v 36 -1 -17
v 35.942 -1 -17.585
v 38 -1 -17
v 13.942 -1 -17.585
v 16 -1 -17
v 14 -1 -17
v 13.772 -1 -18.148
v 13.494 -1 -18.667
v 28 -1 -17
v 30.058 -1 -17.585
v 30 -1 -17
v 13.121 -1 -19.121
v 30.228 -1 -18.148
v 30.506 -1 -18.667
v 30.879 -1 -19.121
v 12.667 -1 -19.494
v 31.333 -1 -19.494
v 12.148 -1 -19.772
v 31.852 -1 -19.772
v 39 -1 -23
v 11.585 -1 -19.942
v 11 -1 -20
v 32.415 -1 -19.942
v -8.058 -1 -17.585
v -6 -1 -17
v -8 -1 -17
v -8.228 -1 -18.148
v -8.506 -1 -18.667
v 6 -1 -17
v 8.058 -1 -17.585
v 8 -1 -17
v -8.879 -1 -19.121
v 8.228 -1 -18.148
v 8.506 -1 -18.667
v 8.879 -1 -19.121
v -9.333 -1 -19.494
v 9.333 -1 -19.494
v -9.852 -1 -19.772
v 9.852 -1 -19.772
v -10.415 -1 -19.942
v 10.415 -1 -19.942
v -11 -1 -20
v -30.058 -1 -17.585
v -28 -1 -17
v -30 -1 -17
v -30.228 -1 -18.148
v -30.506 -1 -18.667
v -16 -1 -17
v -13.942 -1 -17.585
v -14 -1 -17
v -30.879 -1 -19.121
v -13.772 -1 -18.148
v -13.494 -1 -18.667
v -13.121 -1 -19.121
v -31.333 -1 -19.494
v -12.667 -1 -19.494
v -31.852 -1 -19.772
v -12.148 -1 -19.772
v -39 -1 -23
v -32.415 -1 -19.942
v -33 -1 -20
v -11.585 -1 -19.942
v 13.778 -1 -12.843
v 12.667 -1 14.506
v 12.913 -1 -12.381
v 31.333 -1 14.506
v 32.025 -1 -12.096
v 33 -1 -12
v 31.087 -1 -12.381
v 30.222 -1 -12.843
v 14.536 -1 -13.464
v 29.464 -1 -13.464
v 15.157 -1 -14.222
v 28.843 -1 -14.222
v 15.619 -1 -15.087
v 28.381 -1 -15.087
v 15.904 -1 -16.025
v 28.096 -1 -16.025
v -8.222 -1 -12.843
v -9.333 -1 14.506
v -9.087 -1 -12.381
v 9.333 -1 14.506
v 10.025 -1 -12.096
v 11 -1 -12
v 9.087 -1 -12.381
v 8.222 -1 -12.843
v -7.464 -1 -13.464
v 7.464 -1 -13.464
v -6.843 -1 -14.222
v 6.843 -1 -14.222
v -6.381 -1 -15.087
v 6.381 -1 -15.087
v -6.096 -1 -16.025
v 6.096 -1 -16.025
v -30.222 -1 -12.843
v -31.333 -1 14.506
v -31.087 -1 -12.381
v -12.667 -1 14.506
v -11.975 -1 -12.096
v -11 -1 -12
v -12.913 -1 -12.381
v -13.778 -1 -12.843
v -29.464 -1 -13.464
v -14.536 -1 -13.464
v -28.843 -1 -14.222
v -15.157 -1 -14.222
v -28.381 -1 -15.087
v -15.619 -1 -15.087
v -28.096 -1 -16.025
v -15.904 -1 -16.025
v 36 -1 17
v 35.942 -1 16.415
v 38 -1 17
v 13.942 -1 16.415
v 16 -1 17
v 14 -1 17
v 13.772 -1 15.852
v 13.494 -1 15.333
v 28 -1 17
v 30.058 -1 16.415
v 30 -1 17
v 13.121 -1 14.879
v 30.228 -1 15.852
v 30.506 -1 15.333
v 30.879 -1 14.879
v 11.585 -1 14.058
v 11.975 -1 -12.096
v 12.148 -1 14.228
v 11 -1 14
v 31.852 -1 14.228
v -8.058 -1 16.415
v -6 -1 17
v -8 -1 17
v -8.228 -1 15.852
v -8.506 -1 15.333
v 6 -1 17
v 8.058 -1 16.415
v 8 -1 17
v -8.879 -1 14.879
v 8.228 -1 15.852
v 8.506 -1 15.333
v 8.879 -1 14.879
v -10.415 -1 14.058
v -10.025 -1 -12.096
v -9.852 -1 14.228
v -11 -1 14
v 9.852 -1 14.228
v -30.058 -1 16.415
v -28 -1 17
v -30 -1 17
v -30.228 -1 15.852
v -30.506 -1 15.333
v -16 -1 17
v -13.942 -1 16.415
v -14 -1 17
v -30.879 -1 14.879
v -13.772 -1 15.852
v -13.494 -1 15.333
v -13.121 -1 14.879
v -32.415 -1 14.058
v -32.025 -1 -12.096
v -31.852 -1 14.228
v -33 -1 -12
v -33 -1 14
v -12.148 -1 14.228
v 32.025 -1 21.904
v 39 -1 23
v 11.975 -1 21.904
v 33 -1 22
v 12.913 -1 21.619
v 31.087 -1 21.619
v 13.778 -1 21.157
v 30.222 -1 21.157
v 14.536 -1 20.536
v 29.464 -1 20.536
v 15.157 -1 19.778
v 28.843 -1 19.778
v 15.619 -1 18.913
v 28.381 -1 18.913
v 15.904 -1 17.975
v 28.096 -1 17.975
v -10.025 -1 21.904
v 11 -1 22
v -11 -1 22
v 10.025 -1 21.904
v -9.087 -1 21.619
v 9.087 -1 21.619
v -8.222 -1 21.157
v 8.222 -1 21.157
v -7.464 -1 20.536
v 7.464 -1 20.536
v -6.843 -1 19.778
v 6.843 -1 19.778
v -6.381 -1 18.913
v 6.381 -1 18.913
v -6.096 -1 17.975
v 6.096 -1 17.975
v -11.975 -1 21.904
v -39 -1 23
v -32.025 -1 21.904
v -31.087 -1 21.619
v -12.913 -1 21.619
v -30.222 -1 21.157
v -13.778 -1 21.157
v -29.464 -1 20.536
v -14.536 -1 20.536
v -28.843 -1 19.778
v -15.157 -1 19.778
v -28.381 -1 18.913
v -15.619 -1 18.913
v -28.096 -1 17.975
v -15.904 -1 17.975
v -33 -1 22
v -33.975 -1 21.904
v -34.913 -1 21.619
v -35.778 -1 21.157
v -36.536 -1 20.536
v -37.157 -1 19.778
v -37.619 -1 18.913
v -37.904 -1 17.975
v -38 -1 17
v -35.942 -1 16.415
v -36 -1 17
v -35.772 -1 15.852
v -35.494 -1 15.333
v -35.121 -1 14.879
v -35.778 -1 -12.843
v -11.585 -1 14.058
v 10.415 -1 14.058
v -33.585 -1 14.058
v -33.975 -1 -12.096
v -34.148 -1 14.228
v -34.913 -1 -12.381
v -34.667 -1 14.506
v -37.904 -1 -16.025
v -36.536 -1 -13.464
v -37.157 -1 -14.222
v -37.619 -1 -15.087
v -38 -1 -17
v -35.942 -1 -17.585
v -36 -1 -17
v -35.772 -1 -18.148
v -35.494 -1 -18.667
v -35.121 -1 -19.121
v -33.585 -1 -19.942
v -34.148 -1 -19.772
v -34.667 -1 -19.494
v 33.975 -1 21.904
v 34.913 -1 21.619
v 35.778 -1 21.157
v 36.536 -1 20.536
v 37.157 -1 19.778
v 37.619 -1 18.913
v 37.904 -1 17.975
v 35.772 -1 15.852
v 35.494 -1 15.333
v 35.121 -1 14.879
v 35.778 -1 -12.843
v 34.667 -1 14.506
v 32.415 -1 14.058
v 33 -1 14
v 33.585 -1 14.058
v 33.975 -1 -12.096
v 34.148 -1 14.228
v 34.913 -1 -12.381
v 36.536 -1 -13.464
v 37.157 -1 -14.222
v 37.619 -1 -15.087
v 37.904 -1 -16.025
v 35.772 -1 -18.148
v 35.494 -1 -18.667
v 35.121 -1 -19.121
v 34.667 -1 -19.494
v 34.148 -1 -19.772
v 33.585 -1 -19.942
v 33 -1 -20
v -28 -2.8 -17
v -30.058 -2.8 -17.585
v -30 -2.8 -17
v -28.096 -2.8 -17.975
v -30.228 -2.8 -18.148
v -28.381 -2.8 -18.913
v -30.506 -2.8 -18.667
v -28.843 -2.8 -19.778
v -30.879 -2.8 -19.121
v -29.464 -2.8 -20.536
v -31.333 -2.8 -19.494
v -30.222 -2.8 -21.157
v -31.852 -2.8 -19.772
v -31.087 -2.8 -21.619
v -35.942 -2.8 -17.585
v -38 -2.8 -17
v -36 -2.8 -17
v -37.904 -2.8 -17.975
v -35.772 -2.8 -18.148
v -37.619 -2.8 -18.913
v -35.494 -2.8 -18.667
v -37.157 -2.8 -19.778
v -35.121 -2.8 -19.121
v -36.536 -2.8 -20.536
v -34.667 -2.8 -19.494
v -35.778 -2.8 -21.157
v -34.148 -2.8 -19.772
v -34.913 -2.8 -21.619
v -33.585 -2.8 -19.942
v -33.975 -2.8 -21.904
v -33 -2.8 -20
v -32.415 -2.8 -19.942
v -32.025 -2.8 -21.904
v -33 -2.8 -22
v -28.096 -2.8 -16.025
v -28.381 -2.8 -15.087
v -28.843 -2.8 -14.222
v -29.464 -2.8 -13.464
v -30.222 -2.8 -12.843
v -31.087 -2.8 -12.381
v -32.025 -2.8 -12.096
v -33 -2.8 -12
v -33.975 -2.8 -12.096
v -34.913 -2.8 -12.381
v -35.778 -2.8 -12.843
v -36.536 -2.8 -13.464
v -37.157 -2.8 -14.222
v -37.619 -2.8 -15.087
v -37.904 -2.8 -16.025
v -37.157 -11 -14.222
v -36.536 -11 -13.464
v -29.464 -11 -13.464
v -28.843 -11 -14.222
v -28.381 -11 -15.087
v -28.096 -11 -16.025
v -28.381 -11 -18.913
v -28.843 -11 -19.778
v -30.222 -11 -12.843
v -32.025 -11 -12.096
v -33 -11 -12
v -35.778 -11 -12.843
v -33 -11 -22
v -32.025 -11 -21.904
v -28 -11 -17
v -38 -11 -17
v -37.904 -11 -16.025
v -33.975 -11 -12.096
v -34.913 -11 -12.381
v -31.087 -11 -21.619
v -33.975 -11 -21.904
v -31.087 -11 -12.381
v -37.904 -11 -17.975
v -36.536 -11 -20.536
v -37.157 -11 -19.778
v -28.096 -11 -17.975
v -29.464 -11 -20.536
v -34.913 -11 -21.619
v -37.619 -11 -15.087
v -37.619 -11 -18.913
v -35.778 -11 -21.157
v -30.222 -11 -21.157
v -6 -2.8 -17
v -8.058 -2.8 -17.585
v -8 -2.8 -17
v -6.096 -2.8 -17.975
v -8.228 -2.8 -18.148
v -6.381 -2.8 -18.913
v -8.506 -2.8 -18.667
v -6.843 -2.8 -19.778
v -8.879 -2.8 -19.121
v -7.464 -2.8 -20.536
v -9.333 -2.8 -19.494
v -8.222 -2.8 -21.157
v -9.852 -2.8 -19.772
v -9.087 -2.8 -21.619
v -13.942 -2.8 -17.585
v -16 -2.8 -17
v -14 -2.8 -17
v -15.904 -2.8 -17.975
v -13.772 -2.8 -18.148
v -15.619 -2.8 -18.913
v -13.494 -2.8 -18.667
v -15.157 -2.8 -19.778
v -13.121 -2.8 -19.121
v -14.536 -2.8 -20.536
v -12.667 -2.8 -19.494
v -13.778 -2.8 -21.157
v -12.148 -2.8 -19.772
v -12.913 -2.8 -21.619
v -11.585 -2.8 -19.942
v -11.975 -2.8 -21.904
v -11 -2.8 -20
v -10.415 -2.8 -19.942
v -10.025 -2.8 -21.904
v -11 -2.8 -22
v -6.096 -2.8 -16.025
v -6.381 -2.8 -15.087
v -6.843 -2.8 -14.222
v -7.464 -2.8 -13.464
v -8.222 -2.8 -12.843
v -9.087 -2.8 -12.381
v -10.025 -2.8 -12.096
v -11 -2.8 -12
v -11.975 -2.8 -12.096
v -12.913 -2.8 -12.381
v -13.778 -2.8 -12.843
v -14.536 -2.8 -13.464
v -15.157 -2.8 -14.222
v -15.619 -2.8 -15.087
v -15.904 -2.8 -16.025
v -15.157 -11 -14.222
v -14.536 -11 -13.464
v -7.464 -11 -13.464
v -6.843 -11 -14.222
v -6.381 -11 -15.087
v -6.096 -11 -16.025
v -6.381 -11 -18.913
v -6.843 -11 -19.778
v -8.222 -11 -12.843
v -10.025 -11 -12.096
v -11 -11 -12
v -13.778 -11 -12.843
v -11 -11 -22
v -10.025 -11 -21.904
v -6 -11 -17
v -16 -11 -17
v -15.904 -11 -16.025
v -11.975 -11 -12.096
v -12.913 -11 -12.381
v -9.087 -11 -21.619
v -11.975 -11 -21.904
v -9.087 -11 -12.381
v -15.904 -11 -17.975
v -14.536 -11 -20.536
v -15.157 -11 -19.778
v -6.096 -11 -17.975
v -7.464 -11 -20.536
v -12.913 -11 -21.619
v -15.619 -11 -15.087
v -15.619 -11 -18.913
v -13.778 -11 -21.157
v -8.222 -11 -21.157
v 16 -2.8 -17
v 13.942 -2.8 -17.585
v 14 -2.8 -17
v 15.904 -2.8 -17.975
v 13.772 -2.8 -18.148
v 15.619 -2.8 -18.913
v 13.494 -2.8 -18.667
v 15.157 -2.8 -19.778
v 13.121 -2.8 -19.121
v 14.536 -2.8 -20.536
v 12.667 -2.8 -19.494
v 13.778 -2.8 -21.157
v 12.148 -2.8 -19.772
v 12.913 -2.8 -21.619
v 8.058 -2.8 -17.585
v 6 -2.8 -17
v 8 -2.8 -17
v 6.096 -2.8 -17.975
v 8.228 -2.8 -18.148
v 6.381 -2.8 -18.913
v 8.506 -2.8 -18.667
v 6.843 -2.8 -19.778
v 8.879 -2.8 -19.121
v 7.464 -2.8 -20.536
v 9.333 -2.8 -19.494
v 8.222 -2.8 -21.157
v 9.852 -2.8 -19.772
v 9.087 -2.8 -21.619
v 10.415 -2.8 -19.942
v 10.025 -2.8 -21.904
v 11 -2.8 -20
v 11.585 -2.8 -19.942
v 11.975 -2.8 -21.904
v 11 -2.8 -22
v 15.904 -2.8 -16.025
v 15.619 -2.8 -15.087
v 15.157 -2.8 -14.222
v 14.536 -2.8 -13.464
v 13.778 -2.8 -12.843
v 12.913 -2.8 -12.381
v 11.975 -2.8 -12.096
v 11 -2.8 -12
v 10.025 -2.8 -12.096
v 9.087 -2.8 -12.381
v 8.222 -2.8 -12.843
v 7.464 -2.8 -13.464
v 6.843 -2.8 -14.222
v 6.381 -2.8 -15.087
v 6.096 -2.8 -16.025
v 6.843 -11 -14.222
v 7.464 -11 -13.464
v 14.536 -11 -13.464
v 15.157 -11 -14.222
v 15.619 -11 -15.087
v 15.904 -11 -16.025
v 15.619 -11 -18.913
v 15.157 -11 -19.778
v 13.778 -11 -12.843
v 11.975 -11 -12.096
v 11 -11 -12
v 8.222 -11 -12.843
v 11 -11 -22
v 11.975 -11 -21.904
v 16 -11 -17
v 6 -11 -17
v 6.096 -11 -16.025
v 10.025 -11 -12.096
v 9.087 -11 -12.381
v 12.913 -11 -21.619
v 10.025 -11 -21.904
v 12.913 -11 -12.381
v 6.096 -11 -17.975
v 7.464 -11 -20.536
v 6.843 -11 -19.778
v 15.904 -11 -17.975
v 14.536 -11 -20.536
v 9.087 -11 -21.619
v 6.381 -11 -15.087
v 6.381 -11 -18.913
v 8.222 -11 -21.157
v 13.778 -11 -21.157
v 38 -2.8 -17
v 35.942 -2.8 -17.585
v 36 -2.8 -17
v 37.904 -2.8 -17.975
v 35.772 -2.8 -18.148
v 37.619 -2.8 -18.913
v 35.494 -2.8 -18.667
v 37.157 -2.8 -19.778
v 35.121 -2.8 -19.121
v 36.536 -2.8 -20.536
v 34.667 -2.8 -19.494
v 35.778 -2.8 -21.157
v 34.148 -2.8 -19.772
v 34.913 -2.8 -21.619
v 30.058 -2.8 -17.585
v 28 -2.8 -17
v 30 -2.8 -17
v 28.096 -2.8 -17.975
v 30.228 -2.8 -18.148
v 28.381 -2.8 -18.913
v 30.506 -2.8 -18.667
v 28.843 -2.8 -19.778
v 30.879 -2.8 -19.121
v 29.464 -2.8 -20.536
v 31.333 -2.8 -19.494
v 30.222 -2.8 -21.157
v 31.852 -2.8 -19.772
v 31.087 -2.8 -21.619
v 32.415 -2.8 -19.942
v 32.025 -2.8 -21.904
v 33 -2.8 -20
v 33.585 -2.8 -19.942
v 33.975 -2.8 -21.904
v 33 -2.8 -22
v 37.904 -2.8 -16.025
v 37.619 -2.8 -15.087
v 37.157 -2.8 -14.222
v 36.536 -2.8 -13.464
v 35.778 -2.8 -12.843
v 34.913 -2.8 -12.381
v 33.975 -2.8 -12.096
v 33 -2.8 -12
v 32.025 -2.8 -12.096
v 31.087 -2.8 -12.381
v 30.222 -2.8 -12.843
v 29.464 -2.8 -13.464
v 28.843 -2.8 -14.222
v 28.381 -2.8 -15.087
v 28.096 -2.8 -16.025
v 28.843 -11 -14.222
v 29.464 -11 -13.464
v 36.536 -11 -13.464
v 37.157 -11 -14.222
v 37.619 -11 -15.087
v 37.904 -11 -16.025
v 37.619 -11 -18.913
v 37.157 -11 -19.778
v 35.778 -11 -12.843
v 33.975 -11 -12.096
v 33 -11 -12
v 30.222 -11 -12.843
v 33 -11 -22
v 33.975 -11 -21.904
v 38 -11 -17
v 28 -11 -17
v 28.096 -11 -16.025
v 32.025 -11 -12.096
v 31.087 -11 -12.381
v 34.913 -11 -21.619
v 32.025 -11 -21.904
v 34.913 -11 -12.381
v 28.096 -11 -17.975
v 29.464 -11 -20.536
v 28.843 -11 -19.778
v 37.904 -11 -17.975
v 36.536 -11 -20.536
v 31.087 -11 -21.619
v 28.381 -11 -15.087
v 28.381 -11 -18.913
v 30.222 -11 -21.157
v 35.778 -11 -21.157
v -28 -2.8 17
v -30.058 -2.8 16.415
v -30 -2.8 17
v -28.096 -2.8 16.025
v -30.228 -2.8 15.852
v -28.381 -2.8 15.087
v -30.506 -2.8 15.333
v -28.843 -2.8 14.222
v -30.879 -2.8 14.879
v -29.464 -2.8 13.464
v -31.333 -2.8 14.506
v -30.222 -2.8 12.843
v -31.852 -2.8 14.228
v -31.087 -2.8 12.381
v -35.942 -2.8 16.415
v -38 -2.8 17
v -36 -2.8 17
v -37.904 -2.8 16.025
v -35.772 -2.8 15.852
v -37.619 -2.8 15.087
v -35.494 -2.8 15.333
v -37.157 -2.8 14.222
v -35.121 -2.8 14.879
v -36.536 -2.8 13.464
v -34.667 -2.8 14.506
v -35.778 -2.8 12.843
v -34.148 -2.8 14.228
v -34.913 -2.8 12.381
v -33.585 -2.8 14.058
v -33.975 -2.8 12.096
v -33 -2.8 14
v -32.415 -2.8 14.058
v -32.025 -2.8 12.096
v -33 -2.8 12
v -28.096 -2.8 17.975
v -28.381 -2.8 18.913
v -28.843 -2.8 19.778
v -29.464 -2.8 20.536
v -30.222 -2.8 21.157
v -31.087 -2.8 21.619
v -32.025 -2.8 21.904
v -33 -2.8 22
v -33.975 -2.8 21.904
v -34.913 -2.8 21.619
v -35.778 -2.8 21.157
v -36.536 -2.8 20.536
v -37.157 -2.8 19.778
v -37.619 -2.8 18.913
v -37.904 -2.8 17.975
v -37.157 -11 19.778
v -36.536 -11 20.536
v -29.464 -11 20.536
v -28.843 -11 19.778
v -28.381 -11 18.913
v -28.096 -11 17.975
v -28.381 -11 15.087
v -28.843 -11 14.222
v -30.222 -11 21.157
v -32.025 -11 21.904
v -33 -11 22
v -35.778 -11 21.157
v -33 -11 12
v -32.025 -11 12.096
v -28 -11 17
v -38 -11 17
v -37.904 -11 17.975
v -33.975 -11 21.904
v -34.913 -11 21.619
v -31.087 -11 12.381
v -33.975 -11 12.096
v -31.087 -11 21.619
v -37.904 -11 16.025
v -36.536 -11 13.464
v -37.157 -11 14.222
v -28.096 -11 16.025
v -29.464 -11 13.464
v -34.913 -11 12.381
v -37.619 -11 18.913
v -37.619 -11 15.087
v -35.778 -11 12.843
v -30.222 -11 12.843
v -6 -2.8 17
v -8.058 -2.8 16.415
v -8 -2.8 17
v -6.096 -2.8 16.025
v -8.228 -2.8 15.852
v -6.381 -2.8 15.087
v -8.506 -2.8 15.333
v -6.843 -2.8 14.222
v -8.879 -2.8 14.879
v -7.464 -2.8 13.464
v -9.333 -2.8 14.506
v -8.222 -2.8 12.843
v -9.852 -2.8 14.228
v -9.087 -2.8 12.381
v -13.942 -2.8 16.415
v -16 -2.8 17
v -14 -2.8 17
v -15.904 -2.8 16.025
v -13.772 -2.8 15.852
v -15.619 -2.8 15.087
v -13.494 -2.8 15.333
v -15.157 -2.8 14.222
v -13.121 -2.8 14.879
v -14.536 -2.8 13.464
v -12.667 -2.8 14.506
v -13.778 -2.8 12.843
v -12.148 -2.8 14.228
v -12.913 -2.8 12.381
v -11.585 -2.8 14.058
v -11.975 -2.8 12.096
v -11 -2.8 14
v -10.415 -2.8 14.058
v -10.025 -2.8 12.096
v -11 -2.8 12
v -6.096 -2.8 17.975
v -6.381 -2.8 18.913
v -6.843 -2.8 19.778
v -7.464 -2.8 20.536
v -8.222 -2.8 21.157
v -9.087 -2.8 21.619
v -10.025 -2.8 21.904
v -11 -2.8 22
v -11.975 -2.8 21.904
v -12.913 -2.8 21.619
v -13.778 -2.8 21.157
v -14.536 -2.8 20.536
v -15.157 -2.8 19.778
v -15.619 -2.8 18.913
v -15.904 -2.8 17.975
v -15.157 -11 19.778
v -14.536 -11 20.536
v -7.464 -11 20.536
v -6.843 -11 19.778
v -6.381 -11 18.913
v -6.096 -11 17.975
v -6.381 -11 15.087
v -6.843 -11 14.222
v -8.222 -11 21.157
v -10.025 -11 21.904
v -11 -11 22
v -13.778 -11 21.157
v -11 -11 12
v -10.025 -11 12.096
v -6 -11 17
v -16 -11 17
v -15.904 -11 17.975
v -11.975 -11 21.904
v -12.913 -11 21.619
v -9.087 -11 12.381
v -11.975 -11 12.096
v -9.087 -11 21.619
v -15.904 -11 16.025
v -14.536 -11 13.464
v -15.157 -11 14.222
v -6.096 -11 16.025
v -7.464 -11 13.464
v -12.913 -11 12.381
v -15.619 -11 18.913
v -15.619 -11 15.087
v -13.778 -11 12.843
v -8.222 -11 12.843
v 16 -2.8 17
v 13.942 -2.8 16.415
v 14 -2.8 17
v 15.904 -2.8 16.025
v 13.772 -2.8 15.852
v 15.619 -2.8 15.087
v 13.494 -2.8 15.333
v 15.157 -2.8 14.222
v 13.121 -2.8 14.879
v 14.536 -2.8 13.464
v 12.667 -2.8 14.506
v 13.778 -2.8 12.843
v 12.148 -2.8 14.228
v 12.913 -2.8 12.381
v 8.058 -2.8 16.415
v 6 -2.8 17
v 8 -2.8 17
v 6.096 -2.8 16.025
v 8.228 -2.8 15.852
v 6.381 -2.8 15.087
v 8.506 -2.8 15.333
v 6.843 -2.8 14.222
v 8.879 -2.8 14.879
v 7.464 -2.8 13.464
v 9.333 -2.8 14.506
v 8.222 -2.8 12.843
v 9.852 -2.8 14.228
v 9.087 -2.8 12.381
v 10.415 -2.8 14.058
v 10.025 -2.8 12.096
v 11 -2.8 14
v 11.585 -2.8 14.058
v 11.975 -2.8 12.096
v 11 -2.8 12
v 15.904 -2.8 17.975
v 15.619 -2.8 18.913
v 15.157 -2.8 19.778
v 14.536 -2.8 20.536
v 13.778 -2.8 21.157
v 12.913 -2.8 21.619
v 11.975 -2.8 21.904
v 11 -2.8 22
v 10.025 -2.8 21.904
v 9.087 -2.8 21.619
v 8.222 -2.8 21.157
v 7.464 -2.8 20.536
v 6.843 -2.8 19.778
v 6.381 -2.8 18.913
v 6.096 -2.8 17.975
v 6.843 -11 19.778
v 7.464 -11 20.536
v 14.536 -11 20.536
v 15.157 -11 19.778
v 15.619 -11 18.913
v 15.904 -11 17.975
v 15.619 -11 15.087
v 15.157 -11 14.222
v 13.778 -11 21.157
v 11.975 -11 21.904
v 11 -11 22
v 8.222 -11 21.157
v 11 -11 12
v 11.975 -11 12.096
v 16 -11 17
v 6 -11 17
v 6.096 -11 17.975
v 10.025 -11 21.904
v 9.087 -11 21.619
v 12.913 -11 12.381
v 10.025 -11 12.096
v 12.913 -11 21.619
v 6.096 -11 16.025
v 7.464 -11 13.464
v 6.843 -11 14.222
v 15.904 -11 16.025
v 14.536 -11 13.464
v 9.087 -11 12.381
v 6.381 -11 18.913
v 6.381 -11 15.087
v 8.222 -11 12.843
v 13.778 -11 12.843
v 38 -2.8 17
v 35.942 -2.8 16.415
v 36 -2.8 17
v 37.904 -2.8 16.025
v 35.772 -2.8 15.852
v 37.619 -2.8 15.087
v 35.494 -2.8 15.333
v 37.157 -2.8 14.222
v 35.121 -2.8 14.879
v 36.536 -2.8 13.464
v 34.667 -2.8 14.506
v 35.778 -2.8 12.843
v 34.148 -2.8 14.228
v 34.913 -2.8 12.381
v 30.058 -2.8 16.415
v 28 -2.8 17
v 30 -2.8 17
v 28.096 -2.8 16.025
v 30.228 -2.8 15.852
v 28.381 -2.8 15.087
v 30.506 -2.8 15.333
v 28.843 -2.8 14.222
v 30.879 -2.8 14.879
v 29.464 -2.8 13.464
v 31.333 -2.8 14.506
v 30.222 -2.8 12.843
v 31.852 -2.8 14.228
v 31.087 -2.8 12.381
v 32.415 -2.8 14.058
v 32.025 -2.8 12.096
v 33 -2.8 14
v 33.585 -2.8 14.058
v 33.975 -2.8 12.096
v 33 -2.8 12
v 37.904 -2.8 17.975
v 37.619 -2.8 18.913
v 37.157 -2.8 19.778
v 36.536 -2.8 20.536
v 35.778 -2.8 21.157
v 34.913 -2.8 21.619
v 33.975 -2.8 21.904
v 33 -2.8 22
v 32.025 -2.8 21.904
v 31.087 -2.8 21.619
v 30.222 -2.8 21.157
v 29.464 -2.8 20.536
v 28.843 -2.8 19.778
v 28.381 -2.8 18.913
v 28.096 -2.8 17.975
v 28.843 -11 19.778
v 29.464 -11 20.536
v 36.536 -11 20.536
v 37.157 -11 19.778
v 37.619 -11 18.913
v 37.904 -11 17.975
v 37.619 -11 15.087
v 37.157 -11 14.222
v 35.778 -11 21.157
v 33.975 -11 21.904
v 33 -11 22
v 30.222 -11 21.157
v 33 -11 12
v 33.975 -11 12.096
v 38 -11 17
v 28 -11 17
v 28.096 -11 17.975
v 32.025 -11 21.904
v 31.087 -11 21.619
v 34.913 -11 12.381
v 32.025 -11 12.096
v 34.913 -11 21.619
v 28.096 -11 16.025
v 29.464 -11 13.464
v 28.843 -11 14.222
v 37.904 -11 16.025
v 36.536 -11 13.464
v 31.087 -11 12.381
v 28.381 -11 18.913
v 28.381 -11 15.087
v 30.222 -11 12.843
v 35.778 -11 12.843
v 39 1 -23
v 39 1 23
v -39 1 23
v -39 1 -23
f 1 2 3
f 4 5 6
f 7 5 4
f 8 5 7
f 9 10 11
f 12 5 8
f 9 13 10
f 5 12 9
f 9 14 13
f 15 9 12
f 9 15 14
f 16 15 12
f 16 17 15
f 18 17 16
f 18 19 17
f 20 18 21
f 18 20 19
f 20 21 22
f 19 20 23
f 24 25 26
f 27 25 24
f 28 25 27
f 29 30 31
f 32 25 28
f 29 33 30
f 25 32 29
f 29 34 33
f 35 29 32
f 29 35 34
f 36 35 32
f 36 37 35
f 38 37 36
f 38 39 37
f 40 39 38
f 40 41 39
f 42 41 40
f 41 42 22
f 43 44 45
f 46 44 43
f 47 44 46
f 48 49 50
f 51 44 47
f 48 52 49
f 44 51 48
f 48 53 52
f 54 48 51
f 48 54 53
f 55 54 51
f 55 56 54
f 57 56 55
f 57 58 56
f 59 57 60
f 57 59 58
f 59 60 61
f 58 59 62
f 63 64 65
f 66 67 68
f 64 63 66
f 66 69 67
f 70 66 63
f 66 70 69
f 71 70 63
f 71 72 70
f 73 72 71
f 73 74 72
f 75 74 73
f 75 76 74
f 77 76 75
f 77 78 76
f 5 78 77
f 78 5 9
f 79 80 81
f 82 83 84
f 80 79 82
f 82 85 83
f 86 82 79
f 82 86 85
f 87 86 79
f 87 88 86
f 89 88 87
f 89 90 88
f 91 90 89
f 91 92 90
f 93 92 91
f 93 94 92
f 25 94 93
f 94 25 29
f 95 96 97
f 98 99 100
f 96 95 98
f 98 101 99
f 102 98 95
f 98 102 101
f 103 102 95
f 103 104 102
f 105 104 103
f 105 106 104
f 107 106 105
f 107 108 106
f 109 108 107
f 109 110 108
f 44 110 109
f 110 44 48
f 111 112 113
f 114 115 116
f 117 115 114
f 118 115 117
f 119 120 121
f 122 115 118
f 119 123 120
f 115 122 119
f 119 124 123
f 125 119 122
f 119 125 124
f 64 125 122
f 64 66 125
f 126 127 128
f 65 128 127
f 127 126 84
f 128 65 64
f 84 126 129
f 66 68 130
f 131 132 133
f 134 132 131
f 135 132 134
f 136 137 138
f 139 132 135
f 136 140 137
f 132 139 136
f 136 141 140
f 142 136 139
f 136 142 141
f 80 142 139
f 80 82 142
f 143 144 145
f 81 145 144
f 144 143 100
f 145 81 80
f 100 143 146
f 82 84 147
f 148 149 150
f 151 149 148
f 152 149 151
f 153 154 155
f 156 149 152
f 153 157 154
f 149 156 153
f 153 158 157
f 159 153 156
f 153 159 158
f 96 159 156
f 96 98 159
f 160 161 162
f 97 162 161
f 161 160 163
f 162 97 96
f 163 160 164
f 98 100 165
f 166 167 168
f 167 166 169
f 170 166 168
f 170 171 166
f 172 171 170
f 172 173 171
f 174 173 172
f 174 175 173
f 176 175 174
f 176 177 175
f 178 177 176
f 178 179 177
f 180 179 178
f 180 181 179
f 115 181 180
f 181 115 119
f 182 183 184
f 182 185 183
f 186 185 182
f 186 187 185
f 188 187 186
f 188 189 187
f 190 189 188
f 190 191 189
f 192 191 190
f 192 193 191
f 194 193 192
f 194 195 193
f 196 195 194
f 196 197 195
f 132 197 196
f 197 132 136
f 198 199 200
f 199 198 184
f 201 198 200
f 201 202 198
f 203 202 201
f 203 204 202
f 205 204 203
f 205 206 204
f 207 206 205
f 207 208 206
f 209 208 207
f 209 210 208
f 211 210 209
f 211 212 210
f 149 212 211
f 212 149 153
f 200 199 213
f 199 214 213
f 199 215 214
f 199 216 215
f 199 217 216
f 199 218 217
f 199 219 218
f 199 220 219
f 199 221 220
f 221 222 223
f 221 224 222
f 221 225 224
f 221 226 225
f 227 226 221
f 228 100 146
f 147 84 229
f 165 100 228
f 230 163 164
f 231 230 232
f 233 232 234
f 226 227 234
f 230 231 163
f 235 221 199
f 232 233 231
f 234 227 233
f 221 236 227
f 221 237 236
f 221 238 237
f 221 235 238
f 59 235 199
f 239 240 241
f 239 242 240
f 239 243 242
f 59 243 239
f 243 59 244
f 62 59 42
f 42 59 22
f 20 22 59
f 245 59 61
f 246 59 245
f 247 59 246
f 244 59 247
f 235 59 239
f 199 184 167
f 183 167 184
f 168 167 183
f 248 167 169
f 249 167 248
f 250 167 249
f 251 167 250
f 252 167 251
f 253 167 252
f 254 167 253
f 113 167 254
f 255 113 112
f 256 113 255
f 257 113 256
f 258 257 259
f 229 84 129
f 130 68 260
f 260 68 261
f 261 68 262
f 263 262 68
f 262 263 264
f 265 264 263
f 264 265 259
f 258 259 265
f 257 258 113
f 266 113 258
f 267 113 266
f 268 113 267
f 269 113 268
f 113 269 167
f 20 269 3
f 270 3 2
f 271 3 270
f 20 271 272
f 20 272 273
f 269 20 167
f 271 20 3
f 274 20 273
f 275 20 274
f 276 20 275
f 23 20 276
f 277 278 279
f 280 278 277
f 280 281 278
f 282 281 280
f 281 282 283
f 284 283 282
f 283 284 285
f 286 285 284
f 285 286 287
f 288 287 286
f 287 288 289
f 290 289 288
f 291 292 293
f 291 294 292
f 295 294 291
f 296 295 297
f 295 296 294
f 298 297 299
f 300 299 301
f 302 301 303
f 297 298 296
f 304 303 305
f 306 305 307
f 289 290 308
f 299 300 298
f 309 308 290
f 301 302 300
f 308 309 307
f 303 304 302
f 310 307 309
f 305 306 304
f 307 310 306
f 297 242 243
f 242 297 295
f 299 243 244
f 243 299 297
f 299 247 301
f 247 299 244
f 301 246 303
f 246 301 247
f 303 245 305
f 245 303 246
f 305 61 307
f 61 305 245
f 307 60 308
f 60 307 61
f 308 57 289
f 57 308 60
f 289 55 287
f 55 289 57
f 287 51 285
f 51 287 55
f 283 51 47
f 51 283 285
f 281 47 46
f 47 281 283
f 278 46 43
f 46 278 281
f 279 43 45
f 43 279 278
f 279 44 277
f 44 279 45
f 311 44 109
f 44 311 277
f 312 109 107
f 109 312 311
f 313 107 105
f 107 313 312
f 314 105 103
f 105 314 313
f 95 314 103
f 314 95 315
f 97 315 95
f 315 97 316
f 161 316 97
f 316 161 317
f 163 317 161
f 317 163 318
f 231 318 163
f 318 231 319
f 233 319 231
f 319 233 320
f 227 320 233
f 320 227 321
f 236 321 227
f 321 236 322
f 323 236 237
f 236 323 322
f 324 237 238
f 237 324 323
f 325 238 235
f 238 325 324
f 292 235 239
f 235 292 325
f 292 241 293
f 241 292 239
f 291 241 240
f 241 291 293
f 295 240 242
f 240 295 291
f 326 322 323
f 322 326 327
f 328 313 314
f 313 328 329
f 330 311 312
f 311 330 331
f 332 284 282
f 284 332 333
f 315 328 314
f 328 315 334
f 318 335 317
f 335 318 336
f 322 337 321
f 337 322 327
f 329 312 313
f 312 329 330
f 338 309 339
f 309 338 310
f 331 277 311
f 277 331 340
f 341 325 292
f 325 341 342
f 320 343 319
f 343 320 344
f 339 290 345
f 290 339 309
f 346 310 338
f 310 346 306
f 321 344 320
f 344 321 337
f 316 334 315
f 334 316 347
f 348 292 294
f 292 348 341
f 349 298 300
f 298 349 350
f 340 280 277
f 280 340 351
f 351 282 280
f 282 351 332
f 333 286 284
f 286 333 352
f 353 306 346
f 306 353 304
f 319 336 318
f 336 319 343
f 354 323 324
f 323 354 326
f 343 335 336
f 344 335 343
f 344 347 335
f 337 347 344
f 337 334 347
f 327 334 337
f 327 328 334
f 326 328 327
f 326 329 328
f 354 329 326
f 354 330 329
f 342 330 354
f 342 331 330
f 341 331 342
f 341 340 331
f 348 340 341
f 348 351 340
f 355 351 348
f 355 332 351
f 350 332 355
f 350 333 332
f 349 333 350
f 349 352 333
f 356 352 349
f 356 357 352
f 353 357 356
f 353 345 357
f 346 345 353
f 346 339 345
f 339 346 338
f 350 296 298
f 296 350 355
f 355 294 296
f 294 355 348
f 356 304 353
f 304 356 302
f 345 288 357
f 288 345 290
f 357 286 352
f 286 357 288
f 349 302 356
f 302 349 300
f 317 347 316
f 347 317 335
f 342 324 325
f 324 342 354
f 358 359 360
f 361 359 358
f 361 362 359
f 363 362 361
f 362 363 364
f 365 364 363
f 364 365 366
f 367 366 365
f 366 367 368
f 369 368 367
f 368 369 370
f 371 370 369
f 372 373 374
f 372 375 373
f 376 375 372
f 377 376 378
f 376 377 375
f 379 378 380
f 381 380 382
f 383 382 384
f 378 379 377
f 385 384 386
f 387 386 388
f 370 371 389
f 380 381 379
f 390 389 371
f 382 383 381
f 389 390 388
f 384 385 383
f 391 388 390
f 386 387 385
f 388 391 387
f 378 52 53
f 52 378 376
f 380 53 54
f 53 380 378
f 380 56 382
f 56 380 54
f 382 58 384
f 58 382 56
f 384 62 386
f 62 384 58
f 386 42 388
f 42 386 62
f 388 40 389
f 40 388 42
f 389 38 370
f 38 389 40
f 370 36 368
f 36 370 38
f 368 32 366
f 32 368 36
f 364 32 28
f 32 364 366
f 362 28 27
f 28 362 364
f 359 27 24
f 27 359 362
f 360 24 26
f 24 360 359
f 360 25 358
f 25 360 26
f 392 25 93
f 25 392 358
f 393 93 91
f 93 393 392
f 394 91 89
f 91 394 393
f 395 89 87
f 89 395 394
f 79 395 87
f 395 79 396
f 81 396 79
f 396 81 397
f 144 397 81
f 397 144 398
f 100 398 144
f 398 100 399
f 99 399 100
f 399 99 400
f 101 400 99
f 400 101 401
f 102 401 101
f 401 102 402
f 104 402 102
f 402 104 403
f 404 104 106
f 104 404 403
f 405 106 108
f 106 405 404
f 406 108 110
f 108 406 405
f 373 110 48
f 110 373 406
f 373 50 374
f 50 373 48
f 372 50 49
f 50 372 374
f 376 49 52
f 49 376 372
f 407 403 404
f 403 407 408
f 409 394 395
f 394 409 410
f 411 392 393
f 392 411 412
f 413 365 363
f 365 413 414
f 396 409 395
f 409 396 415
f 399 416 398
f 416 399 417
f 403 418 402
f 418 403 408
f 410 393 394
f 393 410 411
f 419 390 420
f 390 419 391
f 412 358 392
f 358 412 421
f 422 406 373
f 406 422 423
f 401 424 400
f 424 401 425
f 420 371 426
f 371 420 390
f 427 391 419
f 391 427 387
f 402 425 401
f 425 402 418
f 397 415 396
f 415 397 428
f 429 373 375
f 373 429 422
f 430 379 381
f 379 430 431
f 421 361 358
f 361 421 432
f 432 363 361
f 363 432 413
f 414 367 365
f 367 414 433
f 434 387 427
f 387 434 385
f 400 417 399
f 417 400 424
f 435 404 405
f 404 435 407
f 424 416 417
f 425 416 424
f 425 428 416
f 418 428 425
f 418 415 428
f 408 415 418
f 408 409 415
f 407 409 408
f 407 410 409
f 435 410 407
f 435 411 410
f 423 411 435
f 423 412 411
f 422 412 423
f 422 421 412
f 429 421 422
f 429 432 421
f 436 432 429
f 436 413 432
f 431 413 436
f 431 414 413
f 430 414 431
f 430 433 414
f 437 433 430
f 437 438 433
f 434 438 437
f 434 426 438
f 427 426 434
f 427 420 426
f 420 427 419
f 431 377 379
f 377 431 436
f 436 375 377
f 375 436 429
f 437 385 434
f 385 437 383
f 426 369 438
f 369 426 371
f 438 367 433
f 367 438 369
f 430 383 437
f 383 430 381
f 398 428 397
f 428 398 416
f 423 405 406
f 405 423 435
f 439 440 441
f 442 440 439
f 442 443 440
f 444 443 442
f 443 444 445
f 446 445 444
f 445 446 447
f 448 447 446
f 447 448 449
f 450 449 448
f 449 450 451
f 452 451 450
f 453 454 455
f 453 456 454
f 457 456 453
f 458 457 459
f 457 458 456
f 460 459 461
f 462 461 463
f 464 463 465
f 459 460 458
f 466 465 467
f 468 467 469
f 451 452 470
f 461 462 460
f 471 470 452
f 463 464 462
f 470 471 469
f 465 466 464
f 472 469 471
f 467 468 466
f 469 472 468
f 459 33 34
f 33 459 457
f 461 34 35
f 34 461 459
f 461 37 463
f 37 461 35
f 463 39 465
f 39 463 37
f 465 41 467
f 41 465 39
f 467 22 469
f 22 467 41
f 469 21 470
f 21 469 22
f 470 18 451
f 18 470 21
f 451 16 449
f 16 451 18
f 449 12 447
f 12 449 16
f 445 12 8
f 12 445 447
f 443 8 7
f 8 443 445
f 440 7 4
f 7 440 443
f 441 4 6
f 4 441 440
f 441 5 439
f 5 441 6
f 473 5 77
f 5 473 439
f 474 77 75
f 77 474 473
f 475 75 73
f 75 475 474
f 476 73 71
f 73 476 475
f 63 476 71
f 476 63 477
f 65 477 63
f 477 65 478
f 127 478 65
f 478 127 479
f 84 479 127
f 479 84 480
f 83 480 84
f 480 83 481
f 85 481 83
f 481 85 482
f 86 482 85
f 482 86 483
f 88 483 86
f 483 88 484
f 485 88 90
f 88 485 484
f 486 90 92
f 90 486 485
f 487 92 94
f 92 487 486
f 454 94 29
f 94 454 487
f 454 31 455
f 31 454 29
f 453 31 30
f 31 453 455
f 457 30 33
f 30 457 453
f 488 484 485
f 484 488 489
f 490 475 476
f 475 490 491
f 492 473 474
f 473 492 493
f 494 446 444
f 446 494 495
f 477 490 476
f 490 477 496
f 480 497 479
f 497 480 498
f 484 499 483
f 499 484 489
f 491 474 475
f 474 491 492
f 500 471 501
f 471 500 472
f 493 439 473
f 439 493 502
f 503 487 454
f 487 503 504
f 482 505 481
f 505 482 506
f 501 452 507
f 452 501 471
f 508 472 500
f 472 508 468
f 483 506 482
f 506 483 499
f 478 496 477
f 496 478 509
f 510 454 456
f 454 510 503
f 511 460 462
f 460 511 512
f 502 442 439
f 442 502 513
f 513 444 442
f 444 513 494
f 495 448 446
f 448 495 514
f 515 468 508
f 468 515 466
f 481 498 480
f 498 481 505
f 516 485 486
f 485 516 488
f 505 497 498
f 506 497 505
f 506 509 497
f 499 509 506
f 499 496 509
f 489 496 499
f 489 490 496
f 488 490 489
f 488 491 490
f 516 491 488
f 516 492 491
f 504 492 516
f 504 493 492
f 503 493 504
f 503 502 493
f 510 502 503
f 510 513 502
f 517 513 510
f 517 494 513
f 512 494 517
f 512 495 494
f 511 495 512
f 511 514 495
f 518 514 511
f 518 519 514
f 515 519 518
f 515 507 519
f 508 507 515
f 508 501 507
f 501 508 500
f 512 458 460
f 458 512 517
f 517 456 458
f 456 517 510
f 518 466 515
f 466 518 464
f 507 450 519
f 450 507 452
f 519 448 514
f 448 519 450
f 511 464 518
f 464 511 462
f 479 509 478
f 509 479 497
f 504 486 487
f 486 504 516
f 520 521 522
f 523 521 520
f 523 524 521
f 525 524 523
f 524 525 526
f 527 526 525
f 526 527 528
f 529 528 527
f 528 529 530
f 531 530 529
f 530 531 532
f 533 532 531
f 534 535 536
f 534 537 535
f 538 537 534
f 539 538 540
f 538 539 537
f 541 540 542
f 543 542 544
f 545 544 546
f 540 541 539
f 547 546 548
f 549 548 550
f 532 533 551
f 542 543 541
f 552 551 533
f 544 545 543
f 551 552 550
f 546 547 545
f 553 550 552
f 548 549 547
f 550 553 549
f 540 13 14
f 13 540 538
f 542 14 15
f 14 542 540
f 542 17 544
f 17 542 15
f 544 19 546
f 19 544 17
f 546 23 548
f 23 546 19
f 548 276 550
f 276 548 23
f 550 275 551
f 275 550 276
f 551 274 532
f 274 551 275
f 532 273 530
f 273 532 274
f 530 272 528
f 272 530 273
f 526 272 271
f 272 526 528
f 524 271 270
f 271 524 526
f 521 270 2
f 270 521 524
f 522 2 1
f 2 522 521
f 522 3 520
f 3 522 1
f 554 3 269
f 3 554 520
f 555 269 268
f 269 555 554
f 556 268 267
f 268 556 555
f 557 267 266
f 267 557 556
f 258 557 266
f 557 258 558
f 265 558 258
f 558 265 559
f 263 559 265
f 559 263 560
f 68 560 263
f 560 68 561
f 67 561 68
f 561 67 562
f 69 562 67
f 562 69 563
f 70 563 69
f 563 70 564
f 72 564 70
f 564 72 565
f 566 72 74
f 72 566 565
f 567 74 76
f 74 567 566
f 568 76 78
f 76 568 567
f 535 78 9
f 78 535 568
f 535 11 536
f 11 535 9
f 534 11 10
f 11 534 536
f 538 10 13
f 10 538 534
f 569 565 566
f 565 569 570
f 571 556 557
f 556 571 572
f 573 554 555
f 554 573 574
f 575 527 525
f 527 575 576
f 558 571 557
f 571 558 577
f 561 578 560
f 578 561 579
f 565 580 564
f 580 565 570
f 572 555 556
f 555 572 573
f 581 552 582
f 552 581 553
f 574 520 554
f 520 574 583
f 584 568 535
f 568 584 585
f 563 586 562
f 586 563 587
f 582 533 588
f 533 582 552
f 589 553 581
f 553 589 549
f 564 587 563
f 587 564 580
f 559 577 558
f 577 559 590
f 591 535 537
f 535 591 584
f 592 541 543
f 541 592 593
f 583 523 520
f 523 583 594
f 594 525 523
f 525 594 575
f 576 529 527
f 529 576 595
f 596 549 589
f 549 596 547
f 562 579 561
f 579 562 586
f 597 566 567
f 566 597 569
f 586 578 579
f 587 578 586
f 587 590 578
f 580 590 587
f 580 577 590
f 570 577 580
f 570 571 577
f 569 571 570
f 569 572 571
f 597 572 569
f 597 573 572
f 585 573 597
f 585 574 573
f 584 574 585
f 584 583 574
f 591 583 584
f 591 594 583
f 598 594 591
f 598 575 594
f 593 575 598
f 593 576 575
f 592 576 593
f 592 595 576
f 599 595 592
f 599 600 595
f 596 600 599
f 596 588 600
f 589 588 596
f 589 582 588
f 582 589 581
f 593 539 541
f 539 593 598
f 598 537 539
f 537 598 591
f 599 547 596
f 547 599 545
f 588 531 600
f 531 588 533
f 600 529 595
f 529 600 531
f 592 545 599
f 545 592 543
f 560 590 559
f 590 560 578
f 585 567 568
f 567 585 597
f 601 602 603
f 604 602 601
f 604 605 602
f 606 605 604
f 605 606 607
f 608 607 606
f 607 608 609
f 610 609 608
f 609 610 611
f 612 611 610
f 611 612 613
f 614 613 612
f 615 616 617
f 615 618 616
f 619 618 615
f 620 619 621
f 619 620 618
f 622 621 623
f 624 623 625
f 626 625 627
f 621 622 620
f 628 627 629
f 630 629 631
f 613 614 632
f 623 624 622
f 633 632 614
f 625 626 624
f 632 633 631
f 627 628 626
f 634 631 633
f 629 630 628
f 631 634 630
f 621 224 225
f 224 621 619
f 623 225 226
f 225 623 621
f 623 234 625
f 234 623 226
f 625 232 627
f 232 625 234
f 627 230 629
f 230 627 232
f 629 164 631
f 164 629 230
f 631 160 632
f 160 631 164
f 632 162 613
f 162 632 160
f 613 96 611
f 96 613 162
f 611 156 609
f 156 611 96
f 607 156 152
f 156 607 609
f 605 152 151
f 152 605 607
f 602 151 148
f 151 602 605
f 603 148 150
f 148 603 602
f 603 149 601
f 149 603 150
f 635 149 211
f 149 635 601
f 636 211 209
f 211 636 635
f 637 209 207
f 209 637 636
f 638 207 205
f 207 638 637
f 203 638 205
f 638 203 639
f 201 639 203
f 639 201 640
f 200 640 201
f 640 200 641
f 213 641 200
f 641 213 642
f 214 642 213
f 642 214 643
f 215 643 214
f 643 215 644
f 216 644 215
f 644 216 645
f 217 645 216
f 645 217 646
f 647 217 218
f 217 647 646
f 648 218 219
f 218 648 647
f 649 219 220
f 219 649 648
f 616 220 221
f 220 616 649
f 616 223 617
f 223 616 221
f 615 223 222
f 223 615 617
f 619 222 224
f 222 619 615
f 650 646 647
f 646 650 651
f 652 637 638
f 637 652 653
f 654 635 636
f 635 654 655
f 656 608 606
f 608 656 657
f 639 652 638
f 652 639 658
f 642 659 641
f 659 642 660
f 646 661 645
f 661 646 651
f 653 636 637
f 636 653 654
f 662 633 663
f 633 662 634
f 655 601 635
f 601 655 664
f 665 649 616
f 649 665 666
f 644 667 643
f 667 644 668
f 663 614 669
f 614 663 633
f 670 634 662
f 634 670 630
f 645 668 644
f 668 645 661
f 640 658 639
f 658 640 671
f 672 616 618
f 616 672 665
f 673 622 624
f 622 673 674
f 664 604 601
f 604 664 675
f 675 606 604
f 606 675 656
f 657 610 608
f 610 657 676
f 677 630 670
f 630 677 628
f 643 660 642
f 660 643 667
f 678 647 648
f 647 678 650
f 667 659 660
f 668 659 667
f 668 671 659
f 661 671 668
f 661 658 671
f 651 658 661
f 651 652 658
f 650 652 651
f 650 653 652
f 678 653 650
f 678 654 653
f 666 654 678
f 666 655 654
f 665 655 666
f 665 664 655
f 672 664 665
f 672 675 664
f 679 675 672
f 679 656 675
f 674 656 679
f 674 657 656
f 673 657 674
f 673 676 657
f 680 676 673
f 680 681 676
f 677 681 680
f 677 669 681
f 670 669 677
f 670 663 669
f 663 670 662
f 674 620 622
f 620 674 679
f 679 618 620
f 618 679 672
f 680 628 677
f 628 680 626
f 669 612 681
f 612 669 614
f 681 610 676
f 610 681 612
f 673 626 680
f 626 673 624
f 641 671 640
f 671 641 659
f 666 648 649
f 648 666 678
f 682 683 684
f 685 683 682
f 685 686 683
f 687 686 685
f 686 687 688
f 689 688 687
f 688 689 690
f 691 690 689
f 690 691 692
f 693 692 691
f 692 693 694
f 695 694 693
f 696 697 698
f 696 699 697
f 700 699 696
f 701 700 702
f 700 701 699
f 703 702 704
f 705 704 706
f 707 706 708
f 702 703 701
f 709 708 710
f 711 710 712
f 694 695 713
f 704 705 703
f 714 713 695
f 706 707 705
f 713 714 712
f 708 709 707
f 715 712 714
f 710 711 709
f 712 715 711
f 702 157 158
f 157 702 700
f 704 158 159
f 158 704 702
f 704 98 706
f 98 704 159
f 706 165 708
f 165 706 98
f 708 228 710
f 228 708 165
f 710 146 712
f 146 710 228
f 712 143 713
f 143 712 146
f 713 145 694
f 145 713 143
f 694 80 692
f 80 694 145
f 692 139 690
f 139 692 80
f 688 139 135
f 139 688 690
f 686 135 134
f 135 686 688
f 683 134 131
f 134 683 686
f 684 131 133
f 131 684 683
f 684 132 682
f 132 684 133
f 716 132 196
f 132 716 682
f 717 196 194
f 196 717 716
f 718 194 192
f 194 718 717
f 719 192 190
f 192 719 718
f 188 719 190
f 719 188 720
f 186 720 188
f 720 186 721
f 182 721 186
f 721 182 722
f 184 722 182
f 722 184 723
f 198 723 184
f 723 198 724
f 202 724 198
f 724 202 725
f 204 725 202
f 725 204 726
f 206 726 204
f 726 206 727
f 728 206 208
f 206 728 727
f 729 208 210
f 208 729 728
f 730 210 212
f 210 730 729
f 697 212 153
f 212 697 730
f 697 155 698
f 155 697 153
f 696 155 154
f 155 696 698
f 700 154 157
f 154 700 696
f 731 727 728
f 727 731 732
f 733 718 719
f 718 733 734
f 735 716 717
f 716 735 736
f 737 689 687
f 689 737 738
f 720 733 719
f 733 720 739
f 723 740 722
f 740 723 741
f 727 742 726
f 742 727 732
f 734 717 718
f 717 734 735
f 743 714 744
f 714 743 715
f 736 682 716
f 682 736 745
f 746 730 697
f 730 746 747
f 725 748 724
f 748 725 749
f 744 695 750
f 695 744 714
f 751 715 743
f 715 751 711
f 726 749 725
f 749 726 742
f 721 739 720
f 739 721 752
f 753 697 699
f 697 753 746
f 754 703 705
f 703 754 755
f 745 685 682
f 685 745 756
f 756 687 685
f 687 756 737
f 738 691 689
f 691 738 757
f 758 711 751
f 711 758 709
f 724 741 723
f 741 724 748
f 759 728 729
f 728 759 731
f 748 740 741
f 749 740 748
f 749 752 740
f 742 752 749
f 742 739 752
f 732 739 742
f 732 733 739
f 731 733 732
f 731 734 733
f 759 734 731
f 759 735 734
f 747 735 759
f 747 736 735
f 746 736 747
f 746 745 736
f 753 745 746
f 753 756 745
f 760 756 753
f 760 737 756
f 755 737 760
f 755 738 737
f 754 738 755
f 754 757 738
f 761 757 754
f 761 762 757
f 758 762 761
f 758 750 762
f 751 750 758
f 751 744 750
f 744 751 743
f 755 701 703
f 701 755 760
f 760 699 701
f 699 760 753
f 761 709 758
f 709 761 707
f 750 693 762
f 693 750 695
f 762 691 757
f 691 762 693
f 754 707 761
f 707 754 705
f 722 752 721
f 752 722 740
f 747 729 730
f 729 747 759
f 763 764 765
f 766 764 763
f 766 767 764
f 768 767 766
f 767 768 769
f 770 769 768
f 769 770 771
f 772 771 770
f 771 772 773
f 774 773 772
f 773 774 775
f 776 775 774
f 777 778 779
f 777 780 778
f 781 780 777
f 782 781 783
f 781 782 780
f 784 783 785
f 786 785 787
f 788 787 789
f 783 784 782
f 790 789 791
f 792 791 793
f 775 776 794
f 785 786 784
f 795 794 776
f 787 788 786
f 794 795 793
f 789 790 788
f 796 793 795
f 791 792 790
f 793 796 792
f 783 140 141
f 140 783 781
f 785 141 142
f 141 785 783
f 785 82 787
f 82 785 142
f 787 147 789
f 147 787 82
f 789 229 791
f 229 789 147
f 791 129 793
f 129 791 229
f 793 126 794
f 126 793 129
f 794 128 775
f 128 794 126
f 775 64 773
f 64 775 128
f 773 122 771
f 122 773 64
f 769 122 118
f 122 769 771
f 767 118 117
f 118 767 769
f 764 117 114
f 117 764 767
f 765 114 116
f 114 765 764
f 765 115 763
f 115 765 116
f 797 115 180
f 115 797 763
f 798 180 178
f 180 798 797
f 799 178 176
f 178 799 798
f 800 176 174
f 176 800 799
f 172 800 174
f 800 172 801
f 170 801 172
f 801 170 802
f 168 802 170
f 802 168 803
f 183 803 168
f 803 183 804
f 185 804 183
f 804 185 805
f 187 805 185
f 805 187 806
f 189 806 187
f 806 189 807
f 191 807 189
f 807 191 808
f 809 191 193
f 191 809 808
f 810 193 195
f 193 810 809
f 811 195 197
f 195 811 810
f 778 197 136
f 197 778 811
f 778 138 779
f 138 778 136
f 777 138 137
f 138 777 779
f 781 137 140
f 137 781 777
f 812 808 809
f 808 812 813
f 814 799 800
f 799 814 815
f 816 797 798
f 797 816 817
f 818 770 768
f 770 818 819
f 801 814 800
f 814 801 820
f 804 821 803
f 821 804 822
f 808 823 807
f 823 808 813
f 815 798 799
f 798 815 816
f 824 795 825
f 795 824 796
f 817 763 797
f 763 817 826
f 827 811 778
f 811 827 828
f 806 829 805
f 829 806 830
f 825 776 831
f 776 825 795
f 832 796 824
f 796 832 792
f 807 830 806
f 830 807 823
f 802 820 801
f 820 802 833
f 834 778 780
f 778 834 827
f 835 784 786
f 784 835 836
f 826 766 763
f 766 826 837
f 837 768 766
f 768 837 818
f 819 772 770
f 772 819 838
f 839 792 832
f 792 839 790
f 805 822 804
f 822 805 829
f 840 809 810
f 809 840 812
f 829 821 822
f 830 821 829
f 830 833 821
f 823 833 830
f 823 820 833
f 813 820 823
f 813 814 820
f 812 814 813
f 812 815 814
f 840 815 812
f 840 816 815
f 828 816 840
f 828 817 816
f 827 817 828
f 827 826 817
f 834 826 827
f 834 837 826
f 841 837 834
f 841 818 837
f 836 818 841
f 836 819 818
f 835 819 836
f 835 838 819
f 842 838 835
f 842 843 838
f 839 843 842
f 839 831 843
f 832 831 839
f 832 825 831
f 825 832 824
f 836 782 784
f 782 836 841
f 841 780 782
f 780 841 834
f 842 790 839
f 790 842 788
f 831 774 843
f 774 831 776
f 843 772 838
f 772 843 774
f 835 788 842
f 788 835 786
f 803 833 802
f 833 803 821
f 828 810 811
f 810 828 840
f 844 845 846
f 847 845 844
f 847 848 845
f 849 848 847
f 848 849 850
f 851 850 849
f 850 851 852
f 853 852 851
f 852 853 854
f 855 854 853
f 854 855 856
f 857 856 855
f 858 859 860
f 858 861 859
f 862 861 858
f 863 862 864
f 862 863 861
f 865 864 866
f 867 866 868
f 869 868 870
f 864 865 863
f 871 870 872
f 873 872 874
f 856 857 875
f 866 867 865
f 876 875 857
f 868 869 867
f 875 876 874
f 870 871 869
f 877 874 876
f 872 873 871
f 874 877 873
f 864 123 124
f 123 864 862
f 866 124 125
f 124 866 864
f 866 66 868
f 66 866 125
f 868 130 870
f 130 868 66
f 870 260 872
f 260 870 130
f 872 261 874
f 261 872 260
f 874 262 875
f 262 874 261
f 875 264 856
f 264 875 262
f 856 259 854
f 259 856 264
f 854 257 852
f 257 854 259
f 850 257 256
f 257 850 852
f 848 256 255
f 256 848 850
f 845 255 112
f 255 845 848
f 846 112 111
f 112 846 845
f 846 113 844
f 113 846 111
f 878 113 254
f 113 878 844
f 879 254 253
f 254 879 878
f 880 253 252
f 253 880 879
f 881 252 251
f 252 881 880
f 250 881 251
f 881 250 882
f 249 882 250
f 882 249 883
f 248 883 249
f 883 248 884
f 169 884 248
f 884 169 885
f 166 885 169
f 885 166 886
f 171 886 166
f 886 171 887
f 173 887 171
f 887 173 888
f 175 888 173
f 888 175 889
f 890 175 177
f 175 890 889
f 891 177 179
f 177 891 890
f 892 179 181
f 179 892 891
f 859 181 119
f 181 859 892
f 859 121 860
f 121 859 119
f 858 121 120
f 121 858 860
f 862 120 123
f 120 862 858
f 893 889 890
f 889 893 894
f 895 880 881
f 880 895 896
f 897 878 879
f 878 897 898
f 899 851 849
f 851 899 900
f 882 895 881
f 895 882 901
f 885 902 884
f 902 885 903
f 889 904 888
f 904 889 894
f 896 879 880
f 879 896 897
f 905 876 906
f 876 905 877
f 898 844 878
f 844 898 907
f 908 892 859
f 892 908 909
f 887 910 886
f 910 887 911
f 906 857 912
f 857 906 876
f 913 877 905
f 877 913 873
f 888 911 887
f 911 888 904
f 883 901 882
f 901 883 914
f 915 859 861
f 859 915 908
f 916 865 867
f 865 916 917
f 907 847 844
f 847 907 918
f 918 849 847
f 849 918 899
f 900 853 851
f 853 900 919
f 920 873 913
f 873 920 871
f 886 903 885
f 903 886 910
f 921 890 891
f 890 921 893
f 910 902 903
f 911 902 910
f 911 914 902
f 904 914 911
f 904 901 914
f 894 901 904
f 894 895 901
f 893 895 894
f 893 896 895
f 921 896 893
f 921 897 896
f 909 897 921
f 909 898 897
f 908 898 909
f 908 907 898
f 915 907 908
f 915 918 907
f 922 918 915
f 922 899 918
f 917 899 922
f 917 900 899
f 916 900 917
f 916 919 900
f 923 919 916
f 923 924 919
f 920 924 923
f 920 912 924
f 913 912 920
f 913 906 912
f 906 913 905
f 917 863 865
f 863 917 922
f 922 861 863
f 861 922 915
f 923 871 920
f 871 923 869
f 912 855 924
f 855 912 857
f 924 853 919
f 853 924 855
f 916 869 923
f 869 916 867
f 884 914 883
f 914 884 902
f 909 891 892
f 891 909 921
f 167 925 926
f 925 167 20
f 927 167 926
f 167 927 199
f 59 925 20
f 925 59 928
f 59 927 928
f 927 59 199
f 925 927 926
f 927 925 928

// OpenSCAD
// Metal peg board base plate reconstructed from exported 3MF models.
//
// Customizer surface:
// - columns
// - rows
// - plateThickness
//
// Reuse from another file with:
// use <peg-base-plates.scad>
// pegBasePlate(columnCount = 2, rowCount = 2, boardThickness = 2);

/* [Plate] */

// Number of peg columns.
columns = 4; // [1:1:8]

// Number of peg rows.
rows = 2; // [1:1:6]

// Thickness of the plate body in millimeters.
plateThickness = 2; // [1:0.1:5]

/* [Hidden] */

pegDiameter = 10;
notchDiameter = 6;
pegLength = 10;
notchHeight = 1.8;

columnPitch = 22;
rowPitch = 34;

pegSegments = 32;
plateSingleSpan = 14;
plateEdgeMargin = 6;
plateTwoRowHeight = 46;

function plateWidth(columnCount) = columnCount == 1 ? plateSingleSpan : (columnCount - 1) * columnPitch + plateEdgeMargin * 2;
function plateHeight(rowCount) = rowCount == 1 ? plateSingleSpan : rowCount == 2 ? plateTwoRowHeight : rowCount * rowPitch - 18;

function columnCenter(columnIndex, columnCount) = (columnIndex - (columnCount - 1) / 2) * columnPitch;
function rowCenter(rowIndex, rowCount) = (rowIndex - (rowCount - 1) / 2) * rowPitch;

// Peg profile measured from the exported model.
// The small keyed notch near the plate lets the peg flex during insertion.
module pegNotchProfile() {
    union() {
        intersection() {
            circle(d = pegDiameter, $fn = pegSegments);
            translate([-pegDiameter / 2, 0])
                square([pegDiameter, pegDiameter / 2]);
        }

        intersection() {
            circle(d = notchDiameter, $fn = pegSegments);
            translate([-notchDiameter / 2, -notchDiameter / 2])
                square([notchDiameter, notchDiameter / 2]);
        }
    }
}

// Single peg with a short keyed notch at the plate end.
module peg() {
    rotate([90, 0, 0])
        linear_extrude(height = notchHeight)
            pegNotchProfile();

    translate([0, -notchHeight, 0])
        rotate([90, 0, 0])
            cylinder(h = pegLength - notchHeight, d = pegDiameter, $fn = pegSegments);
}

// Reusable plate module.
// columnCount: number of peg columns.
// rowCount: number of peg rows.
// boardThickness: thickness of the rectangular plate body.
module pegBasePlate(columnCount = columns, rowCount = rows, boardThickness = plateThickness) {
    boardWidth = plateWidth(columnCount);
    boardHeight = plateHeight(rowCount);

    union() {
        cube([boardWidth, boardThickness, boardHeight], center = true);

        for (rowIndex = [0 : rowCount - 1]) {
            for (columnIndex = [0 : columnCount - 1]) {
                translate([
                    columnCenter(columnIndex, columnCount),
                    -boardThickness / 2,
                    rowCenter(rowIndex, rowCount)
                ])
                    peg();
            }
        }
    }
}

// Standalone render using the current customizer values.
pegBasePlate();
